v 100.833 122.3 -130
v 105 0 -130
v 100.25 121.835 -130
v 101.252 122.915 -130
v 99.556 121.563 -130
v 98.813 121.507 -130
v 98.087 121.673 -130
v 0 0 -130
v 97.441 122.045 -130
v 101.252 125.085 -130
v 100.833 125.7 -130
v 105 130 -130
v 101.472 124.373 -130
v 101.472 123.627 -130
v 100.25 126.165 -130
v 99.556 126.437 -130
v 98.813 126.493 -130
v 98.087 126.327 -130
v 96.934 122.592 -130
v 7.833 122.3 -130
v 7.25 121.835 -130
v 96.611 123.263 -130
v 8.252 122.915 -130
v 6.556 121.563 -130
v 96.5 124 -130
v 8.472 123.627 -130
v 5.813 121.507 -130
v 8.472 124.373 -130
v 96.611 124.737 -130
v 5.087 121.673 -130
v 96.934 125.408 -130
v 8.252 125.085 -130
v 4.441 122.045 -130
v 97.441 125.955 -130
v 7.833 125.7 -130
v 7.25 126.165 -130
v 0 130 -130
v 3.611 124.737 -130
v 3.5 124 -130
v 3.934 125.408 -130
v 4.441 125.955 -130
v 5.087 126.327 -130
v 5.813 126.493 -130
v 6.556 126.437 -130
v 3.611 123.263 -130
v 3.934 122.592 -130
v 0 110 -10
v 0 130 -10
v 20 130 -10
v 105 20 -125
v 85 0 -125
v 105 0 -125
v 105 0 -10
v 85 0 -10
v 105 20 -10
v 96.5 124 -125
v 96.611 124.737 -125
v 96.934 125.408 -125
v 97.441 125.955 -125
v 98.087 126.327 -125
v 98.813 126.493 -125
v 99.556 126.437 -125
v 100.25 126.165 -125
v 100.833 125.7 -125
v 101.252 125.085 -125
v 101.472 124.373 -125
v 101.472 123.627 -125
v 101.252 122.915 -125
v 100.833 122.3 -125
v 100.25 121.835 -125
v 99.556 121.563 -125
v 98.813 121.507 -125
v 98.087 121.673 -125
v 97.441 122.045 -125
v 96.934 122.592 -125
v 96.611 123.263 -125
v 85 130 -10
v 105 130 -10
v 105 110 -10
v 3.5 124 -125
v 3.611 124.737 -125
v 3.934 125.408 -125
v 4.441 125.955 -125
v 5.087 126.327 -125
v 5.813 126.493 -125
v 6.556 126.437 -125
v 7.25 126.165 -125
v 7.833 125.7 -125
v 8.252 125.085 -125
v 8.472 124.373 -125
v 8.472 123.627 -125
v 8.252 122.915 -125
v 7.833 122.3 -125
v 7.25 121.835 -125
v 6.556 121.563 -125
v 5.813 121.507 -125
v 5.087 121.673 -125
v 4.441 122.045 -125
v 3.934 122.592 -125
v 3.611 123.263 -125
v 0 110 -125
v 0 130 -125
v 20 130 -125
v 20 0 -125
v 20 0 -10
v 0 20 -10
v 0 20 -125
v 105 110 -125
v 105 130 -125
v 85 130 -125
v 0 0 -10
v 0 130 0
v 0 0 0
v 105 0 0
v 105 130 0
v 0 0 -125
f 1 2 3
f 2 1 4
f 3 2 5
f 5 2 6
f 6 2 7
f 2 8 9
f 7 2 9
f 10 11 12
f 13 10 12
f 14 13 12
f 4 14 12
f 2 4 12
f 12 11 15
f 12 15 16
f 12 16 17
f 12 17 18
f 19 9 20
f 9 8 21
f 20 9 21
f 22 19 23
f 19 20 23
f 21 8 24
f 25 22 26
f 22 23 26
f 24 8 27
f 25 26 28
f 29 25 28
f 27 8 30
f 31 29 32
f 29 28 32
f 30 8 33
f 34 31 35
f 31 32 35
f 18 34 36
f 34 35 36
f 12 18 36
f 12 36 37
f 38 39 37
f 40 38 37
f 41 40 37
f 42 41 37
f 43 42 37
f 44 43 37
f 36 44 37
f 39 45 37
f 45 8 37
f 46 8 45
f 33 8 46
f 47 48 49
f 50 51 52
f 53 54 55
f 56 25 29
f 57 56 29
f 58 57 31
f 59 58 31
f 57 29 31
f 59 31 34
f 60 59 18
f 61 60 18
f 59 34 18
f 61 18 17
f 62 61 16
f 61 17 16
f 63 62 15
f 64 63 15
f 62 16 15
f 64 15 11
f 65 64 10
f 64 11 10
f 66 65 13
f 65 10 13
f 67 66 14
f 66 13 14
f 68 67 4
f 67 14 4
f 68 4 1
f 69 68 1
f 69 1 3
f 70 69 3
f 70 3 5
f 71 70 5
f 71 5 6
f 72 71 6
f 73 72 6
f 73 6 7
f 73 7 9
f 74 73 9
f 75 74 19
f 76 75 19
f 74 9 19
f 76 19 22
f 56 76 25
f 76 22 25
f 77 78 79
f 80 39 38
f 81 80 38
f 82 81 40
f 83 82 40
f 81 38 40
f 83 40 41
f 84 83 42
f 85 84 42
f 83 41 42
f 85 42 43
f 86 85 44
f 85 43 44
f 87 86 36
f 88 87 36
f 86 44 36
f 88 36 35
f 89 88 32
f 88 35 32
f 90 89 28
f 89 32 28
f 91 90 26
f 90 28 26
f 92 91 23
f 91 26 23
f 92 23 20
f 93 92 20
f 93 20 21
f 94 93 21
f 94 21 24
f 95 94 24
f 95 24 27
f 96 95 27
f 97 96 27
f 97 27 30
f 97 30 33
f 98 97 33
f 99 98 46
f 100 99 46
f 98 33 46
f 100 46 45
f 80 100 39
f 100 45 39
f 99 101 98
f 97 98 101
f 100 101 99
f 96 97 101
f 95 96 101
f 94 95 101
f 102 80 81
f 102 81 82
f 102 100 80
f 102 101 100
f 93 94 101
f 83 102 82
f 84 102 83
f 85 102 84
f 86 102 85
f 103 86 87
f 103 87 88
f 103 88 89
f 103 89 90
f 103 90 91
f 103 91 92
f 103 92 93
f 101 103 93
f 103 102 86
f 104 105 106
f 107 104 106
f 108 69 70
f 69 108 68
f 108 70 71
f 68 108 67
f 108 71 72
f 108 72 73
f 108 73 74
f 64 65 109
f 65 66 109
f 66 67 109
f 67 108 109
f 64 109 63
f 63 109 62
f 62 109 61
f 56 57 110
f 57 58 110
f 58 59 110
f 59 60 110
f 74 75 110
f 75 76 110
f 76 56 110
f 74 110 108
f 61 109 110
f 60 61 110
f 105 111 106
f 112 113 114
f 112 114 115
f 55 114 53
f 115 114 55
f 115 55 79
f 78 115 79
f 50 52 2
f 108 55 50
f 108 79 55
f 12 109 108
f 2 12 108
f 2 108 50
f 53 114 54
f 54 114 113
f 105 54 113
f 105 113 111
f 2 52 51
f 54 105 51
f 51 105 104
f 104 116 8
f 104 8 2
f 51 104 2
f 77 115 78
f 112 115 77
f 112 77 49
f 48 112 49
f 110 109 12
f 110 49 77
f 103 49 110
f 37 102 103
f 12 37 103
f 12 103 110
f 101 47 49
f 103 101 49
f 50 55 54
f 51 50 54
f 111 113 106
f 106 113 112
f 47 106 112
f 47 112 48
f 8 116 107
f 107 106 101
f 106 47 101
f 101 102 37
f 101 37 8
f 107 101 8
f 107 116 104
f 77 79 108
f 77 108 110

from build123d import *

# Parameters (mm, degrees)
ESQUISSE1_W             = 130
ESQUISSE1_H             = 130
BASE_EXTRUSION_DEPTH    = 105
ENL_V_MAT_EXTRU_1_DEPTH = 115
ESQUISSE4_R             = 2.5
ENL_V_MAT_EXTRU_2_DEPTH = 5


with BuildPart() as part:
    # Esquisse1 → Base-Extrusion (new body)
    with BuildSketch(Plane(origin=(0, 0, 0), x_dir=(0, 0, -1), z_dir=(1, 0, 0))):
        with Locations((65, 65)):
            Rectangle(ESQUISSE1_W, ESQUISSE1_H)
    extrude(amount=BASE_EXTRUSION_DEPTH)

    # Esquisse3 → Enlèv. mat.-Extru.1 (cut)
    with BuildSketch(Plane.XY.offset(-10)):
        Polygon((0, 0), (20, 0), (0, 20), align=None)
        Polygon((0, 130), (0, 110), (20, 130), align=None)
        Polygon((105, 130), (105, 110), (85, 130), align=None)
        Polygon((105, 0), (105, 20), (85, 0), align=None)
    extrude(amount=-ENL_V_MAT_EXTRU_1_DEPTH, mode=Mode.SUBTRACT)

    # Esquisse4 → Enlèv. mat.-Extru.2 (cut)
    with BuildSketch(Plane(origin=(0, 0, -130), x_dir=(-1, 0, 0), z_dir=(0, 0, -1))):
        with Locations((-6, 124)):
            Circle(ESQUISSE4_R)
        with Locations((-99, 124)):
            Circle(ESQUISSE4_R)
    extrude(amount=-ENL_V_MAT_EXTRU_2_DEPTH, mode=Mode.SUBTRACT)


solid = part.part
